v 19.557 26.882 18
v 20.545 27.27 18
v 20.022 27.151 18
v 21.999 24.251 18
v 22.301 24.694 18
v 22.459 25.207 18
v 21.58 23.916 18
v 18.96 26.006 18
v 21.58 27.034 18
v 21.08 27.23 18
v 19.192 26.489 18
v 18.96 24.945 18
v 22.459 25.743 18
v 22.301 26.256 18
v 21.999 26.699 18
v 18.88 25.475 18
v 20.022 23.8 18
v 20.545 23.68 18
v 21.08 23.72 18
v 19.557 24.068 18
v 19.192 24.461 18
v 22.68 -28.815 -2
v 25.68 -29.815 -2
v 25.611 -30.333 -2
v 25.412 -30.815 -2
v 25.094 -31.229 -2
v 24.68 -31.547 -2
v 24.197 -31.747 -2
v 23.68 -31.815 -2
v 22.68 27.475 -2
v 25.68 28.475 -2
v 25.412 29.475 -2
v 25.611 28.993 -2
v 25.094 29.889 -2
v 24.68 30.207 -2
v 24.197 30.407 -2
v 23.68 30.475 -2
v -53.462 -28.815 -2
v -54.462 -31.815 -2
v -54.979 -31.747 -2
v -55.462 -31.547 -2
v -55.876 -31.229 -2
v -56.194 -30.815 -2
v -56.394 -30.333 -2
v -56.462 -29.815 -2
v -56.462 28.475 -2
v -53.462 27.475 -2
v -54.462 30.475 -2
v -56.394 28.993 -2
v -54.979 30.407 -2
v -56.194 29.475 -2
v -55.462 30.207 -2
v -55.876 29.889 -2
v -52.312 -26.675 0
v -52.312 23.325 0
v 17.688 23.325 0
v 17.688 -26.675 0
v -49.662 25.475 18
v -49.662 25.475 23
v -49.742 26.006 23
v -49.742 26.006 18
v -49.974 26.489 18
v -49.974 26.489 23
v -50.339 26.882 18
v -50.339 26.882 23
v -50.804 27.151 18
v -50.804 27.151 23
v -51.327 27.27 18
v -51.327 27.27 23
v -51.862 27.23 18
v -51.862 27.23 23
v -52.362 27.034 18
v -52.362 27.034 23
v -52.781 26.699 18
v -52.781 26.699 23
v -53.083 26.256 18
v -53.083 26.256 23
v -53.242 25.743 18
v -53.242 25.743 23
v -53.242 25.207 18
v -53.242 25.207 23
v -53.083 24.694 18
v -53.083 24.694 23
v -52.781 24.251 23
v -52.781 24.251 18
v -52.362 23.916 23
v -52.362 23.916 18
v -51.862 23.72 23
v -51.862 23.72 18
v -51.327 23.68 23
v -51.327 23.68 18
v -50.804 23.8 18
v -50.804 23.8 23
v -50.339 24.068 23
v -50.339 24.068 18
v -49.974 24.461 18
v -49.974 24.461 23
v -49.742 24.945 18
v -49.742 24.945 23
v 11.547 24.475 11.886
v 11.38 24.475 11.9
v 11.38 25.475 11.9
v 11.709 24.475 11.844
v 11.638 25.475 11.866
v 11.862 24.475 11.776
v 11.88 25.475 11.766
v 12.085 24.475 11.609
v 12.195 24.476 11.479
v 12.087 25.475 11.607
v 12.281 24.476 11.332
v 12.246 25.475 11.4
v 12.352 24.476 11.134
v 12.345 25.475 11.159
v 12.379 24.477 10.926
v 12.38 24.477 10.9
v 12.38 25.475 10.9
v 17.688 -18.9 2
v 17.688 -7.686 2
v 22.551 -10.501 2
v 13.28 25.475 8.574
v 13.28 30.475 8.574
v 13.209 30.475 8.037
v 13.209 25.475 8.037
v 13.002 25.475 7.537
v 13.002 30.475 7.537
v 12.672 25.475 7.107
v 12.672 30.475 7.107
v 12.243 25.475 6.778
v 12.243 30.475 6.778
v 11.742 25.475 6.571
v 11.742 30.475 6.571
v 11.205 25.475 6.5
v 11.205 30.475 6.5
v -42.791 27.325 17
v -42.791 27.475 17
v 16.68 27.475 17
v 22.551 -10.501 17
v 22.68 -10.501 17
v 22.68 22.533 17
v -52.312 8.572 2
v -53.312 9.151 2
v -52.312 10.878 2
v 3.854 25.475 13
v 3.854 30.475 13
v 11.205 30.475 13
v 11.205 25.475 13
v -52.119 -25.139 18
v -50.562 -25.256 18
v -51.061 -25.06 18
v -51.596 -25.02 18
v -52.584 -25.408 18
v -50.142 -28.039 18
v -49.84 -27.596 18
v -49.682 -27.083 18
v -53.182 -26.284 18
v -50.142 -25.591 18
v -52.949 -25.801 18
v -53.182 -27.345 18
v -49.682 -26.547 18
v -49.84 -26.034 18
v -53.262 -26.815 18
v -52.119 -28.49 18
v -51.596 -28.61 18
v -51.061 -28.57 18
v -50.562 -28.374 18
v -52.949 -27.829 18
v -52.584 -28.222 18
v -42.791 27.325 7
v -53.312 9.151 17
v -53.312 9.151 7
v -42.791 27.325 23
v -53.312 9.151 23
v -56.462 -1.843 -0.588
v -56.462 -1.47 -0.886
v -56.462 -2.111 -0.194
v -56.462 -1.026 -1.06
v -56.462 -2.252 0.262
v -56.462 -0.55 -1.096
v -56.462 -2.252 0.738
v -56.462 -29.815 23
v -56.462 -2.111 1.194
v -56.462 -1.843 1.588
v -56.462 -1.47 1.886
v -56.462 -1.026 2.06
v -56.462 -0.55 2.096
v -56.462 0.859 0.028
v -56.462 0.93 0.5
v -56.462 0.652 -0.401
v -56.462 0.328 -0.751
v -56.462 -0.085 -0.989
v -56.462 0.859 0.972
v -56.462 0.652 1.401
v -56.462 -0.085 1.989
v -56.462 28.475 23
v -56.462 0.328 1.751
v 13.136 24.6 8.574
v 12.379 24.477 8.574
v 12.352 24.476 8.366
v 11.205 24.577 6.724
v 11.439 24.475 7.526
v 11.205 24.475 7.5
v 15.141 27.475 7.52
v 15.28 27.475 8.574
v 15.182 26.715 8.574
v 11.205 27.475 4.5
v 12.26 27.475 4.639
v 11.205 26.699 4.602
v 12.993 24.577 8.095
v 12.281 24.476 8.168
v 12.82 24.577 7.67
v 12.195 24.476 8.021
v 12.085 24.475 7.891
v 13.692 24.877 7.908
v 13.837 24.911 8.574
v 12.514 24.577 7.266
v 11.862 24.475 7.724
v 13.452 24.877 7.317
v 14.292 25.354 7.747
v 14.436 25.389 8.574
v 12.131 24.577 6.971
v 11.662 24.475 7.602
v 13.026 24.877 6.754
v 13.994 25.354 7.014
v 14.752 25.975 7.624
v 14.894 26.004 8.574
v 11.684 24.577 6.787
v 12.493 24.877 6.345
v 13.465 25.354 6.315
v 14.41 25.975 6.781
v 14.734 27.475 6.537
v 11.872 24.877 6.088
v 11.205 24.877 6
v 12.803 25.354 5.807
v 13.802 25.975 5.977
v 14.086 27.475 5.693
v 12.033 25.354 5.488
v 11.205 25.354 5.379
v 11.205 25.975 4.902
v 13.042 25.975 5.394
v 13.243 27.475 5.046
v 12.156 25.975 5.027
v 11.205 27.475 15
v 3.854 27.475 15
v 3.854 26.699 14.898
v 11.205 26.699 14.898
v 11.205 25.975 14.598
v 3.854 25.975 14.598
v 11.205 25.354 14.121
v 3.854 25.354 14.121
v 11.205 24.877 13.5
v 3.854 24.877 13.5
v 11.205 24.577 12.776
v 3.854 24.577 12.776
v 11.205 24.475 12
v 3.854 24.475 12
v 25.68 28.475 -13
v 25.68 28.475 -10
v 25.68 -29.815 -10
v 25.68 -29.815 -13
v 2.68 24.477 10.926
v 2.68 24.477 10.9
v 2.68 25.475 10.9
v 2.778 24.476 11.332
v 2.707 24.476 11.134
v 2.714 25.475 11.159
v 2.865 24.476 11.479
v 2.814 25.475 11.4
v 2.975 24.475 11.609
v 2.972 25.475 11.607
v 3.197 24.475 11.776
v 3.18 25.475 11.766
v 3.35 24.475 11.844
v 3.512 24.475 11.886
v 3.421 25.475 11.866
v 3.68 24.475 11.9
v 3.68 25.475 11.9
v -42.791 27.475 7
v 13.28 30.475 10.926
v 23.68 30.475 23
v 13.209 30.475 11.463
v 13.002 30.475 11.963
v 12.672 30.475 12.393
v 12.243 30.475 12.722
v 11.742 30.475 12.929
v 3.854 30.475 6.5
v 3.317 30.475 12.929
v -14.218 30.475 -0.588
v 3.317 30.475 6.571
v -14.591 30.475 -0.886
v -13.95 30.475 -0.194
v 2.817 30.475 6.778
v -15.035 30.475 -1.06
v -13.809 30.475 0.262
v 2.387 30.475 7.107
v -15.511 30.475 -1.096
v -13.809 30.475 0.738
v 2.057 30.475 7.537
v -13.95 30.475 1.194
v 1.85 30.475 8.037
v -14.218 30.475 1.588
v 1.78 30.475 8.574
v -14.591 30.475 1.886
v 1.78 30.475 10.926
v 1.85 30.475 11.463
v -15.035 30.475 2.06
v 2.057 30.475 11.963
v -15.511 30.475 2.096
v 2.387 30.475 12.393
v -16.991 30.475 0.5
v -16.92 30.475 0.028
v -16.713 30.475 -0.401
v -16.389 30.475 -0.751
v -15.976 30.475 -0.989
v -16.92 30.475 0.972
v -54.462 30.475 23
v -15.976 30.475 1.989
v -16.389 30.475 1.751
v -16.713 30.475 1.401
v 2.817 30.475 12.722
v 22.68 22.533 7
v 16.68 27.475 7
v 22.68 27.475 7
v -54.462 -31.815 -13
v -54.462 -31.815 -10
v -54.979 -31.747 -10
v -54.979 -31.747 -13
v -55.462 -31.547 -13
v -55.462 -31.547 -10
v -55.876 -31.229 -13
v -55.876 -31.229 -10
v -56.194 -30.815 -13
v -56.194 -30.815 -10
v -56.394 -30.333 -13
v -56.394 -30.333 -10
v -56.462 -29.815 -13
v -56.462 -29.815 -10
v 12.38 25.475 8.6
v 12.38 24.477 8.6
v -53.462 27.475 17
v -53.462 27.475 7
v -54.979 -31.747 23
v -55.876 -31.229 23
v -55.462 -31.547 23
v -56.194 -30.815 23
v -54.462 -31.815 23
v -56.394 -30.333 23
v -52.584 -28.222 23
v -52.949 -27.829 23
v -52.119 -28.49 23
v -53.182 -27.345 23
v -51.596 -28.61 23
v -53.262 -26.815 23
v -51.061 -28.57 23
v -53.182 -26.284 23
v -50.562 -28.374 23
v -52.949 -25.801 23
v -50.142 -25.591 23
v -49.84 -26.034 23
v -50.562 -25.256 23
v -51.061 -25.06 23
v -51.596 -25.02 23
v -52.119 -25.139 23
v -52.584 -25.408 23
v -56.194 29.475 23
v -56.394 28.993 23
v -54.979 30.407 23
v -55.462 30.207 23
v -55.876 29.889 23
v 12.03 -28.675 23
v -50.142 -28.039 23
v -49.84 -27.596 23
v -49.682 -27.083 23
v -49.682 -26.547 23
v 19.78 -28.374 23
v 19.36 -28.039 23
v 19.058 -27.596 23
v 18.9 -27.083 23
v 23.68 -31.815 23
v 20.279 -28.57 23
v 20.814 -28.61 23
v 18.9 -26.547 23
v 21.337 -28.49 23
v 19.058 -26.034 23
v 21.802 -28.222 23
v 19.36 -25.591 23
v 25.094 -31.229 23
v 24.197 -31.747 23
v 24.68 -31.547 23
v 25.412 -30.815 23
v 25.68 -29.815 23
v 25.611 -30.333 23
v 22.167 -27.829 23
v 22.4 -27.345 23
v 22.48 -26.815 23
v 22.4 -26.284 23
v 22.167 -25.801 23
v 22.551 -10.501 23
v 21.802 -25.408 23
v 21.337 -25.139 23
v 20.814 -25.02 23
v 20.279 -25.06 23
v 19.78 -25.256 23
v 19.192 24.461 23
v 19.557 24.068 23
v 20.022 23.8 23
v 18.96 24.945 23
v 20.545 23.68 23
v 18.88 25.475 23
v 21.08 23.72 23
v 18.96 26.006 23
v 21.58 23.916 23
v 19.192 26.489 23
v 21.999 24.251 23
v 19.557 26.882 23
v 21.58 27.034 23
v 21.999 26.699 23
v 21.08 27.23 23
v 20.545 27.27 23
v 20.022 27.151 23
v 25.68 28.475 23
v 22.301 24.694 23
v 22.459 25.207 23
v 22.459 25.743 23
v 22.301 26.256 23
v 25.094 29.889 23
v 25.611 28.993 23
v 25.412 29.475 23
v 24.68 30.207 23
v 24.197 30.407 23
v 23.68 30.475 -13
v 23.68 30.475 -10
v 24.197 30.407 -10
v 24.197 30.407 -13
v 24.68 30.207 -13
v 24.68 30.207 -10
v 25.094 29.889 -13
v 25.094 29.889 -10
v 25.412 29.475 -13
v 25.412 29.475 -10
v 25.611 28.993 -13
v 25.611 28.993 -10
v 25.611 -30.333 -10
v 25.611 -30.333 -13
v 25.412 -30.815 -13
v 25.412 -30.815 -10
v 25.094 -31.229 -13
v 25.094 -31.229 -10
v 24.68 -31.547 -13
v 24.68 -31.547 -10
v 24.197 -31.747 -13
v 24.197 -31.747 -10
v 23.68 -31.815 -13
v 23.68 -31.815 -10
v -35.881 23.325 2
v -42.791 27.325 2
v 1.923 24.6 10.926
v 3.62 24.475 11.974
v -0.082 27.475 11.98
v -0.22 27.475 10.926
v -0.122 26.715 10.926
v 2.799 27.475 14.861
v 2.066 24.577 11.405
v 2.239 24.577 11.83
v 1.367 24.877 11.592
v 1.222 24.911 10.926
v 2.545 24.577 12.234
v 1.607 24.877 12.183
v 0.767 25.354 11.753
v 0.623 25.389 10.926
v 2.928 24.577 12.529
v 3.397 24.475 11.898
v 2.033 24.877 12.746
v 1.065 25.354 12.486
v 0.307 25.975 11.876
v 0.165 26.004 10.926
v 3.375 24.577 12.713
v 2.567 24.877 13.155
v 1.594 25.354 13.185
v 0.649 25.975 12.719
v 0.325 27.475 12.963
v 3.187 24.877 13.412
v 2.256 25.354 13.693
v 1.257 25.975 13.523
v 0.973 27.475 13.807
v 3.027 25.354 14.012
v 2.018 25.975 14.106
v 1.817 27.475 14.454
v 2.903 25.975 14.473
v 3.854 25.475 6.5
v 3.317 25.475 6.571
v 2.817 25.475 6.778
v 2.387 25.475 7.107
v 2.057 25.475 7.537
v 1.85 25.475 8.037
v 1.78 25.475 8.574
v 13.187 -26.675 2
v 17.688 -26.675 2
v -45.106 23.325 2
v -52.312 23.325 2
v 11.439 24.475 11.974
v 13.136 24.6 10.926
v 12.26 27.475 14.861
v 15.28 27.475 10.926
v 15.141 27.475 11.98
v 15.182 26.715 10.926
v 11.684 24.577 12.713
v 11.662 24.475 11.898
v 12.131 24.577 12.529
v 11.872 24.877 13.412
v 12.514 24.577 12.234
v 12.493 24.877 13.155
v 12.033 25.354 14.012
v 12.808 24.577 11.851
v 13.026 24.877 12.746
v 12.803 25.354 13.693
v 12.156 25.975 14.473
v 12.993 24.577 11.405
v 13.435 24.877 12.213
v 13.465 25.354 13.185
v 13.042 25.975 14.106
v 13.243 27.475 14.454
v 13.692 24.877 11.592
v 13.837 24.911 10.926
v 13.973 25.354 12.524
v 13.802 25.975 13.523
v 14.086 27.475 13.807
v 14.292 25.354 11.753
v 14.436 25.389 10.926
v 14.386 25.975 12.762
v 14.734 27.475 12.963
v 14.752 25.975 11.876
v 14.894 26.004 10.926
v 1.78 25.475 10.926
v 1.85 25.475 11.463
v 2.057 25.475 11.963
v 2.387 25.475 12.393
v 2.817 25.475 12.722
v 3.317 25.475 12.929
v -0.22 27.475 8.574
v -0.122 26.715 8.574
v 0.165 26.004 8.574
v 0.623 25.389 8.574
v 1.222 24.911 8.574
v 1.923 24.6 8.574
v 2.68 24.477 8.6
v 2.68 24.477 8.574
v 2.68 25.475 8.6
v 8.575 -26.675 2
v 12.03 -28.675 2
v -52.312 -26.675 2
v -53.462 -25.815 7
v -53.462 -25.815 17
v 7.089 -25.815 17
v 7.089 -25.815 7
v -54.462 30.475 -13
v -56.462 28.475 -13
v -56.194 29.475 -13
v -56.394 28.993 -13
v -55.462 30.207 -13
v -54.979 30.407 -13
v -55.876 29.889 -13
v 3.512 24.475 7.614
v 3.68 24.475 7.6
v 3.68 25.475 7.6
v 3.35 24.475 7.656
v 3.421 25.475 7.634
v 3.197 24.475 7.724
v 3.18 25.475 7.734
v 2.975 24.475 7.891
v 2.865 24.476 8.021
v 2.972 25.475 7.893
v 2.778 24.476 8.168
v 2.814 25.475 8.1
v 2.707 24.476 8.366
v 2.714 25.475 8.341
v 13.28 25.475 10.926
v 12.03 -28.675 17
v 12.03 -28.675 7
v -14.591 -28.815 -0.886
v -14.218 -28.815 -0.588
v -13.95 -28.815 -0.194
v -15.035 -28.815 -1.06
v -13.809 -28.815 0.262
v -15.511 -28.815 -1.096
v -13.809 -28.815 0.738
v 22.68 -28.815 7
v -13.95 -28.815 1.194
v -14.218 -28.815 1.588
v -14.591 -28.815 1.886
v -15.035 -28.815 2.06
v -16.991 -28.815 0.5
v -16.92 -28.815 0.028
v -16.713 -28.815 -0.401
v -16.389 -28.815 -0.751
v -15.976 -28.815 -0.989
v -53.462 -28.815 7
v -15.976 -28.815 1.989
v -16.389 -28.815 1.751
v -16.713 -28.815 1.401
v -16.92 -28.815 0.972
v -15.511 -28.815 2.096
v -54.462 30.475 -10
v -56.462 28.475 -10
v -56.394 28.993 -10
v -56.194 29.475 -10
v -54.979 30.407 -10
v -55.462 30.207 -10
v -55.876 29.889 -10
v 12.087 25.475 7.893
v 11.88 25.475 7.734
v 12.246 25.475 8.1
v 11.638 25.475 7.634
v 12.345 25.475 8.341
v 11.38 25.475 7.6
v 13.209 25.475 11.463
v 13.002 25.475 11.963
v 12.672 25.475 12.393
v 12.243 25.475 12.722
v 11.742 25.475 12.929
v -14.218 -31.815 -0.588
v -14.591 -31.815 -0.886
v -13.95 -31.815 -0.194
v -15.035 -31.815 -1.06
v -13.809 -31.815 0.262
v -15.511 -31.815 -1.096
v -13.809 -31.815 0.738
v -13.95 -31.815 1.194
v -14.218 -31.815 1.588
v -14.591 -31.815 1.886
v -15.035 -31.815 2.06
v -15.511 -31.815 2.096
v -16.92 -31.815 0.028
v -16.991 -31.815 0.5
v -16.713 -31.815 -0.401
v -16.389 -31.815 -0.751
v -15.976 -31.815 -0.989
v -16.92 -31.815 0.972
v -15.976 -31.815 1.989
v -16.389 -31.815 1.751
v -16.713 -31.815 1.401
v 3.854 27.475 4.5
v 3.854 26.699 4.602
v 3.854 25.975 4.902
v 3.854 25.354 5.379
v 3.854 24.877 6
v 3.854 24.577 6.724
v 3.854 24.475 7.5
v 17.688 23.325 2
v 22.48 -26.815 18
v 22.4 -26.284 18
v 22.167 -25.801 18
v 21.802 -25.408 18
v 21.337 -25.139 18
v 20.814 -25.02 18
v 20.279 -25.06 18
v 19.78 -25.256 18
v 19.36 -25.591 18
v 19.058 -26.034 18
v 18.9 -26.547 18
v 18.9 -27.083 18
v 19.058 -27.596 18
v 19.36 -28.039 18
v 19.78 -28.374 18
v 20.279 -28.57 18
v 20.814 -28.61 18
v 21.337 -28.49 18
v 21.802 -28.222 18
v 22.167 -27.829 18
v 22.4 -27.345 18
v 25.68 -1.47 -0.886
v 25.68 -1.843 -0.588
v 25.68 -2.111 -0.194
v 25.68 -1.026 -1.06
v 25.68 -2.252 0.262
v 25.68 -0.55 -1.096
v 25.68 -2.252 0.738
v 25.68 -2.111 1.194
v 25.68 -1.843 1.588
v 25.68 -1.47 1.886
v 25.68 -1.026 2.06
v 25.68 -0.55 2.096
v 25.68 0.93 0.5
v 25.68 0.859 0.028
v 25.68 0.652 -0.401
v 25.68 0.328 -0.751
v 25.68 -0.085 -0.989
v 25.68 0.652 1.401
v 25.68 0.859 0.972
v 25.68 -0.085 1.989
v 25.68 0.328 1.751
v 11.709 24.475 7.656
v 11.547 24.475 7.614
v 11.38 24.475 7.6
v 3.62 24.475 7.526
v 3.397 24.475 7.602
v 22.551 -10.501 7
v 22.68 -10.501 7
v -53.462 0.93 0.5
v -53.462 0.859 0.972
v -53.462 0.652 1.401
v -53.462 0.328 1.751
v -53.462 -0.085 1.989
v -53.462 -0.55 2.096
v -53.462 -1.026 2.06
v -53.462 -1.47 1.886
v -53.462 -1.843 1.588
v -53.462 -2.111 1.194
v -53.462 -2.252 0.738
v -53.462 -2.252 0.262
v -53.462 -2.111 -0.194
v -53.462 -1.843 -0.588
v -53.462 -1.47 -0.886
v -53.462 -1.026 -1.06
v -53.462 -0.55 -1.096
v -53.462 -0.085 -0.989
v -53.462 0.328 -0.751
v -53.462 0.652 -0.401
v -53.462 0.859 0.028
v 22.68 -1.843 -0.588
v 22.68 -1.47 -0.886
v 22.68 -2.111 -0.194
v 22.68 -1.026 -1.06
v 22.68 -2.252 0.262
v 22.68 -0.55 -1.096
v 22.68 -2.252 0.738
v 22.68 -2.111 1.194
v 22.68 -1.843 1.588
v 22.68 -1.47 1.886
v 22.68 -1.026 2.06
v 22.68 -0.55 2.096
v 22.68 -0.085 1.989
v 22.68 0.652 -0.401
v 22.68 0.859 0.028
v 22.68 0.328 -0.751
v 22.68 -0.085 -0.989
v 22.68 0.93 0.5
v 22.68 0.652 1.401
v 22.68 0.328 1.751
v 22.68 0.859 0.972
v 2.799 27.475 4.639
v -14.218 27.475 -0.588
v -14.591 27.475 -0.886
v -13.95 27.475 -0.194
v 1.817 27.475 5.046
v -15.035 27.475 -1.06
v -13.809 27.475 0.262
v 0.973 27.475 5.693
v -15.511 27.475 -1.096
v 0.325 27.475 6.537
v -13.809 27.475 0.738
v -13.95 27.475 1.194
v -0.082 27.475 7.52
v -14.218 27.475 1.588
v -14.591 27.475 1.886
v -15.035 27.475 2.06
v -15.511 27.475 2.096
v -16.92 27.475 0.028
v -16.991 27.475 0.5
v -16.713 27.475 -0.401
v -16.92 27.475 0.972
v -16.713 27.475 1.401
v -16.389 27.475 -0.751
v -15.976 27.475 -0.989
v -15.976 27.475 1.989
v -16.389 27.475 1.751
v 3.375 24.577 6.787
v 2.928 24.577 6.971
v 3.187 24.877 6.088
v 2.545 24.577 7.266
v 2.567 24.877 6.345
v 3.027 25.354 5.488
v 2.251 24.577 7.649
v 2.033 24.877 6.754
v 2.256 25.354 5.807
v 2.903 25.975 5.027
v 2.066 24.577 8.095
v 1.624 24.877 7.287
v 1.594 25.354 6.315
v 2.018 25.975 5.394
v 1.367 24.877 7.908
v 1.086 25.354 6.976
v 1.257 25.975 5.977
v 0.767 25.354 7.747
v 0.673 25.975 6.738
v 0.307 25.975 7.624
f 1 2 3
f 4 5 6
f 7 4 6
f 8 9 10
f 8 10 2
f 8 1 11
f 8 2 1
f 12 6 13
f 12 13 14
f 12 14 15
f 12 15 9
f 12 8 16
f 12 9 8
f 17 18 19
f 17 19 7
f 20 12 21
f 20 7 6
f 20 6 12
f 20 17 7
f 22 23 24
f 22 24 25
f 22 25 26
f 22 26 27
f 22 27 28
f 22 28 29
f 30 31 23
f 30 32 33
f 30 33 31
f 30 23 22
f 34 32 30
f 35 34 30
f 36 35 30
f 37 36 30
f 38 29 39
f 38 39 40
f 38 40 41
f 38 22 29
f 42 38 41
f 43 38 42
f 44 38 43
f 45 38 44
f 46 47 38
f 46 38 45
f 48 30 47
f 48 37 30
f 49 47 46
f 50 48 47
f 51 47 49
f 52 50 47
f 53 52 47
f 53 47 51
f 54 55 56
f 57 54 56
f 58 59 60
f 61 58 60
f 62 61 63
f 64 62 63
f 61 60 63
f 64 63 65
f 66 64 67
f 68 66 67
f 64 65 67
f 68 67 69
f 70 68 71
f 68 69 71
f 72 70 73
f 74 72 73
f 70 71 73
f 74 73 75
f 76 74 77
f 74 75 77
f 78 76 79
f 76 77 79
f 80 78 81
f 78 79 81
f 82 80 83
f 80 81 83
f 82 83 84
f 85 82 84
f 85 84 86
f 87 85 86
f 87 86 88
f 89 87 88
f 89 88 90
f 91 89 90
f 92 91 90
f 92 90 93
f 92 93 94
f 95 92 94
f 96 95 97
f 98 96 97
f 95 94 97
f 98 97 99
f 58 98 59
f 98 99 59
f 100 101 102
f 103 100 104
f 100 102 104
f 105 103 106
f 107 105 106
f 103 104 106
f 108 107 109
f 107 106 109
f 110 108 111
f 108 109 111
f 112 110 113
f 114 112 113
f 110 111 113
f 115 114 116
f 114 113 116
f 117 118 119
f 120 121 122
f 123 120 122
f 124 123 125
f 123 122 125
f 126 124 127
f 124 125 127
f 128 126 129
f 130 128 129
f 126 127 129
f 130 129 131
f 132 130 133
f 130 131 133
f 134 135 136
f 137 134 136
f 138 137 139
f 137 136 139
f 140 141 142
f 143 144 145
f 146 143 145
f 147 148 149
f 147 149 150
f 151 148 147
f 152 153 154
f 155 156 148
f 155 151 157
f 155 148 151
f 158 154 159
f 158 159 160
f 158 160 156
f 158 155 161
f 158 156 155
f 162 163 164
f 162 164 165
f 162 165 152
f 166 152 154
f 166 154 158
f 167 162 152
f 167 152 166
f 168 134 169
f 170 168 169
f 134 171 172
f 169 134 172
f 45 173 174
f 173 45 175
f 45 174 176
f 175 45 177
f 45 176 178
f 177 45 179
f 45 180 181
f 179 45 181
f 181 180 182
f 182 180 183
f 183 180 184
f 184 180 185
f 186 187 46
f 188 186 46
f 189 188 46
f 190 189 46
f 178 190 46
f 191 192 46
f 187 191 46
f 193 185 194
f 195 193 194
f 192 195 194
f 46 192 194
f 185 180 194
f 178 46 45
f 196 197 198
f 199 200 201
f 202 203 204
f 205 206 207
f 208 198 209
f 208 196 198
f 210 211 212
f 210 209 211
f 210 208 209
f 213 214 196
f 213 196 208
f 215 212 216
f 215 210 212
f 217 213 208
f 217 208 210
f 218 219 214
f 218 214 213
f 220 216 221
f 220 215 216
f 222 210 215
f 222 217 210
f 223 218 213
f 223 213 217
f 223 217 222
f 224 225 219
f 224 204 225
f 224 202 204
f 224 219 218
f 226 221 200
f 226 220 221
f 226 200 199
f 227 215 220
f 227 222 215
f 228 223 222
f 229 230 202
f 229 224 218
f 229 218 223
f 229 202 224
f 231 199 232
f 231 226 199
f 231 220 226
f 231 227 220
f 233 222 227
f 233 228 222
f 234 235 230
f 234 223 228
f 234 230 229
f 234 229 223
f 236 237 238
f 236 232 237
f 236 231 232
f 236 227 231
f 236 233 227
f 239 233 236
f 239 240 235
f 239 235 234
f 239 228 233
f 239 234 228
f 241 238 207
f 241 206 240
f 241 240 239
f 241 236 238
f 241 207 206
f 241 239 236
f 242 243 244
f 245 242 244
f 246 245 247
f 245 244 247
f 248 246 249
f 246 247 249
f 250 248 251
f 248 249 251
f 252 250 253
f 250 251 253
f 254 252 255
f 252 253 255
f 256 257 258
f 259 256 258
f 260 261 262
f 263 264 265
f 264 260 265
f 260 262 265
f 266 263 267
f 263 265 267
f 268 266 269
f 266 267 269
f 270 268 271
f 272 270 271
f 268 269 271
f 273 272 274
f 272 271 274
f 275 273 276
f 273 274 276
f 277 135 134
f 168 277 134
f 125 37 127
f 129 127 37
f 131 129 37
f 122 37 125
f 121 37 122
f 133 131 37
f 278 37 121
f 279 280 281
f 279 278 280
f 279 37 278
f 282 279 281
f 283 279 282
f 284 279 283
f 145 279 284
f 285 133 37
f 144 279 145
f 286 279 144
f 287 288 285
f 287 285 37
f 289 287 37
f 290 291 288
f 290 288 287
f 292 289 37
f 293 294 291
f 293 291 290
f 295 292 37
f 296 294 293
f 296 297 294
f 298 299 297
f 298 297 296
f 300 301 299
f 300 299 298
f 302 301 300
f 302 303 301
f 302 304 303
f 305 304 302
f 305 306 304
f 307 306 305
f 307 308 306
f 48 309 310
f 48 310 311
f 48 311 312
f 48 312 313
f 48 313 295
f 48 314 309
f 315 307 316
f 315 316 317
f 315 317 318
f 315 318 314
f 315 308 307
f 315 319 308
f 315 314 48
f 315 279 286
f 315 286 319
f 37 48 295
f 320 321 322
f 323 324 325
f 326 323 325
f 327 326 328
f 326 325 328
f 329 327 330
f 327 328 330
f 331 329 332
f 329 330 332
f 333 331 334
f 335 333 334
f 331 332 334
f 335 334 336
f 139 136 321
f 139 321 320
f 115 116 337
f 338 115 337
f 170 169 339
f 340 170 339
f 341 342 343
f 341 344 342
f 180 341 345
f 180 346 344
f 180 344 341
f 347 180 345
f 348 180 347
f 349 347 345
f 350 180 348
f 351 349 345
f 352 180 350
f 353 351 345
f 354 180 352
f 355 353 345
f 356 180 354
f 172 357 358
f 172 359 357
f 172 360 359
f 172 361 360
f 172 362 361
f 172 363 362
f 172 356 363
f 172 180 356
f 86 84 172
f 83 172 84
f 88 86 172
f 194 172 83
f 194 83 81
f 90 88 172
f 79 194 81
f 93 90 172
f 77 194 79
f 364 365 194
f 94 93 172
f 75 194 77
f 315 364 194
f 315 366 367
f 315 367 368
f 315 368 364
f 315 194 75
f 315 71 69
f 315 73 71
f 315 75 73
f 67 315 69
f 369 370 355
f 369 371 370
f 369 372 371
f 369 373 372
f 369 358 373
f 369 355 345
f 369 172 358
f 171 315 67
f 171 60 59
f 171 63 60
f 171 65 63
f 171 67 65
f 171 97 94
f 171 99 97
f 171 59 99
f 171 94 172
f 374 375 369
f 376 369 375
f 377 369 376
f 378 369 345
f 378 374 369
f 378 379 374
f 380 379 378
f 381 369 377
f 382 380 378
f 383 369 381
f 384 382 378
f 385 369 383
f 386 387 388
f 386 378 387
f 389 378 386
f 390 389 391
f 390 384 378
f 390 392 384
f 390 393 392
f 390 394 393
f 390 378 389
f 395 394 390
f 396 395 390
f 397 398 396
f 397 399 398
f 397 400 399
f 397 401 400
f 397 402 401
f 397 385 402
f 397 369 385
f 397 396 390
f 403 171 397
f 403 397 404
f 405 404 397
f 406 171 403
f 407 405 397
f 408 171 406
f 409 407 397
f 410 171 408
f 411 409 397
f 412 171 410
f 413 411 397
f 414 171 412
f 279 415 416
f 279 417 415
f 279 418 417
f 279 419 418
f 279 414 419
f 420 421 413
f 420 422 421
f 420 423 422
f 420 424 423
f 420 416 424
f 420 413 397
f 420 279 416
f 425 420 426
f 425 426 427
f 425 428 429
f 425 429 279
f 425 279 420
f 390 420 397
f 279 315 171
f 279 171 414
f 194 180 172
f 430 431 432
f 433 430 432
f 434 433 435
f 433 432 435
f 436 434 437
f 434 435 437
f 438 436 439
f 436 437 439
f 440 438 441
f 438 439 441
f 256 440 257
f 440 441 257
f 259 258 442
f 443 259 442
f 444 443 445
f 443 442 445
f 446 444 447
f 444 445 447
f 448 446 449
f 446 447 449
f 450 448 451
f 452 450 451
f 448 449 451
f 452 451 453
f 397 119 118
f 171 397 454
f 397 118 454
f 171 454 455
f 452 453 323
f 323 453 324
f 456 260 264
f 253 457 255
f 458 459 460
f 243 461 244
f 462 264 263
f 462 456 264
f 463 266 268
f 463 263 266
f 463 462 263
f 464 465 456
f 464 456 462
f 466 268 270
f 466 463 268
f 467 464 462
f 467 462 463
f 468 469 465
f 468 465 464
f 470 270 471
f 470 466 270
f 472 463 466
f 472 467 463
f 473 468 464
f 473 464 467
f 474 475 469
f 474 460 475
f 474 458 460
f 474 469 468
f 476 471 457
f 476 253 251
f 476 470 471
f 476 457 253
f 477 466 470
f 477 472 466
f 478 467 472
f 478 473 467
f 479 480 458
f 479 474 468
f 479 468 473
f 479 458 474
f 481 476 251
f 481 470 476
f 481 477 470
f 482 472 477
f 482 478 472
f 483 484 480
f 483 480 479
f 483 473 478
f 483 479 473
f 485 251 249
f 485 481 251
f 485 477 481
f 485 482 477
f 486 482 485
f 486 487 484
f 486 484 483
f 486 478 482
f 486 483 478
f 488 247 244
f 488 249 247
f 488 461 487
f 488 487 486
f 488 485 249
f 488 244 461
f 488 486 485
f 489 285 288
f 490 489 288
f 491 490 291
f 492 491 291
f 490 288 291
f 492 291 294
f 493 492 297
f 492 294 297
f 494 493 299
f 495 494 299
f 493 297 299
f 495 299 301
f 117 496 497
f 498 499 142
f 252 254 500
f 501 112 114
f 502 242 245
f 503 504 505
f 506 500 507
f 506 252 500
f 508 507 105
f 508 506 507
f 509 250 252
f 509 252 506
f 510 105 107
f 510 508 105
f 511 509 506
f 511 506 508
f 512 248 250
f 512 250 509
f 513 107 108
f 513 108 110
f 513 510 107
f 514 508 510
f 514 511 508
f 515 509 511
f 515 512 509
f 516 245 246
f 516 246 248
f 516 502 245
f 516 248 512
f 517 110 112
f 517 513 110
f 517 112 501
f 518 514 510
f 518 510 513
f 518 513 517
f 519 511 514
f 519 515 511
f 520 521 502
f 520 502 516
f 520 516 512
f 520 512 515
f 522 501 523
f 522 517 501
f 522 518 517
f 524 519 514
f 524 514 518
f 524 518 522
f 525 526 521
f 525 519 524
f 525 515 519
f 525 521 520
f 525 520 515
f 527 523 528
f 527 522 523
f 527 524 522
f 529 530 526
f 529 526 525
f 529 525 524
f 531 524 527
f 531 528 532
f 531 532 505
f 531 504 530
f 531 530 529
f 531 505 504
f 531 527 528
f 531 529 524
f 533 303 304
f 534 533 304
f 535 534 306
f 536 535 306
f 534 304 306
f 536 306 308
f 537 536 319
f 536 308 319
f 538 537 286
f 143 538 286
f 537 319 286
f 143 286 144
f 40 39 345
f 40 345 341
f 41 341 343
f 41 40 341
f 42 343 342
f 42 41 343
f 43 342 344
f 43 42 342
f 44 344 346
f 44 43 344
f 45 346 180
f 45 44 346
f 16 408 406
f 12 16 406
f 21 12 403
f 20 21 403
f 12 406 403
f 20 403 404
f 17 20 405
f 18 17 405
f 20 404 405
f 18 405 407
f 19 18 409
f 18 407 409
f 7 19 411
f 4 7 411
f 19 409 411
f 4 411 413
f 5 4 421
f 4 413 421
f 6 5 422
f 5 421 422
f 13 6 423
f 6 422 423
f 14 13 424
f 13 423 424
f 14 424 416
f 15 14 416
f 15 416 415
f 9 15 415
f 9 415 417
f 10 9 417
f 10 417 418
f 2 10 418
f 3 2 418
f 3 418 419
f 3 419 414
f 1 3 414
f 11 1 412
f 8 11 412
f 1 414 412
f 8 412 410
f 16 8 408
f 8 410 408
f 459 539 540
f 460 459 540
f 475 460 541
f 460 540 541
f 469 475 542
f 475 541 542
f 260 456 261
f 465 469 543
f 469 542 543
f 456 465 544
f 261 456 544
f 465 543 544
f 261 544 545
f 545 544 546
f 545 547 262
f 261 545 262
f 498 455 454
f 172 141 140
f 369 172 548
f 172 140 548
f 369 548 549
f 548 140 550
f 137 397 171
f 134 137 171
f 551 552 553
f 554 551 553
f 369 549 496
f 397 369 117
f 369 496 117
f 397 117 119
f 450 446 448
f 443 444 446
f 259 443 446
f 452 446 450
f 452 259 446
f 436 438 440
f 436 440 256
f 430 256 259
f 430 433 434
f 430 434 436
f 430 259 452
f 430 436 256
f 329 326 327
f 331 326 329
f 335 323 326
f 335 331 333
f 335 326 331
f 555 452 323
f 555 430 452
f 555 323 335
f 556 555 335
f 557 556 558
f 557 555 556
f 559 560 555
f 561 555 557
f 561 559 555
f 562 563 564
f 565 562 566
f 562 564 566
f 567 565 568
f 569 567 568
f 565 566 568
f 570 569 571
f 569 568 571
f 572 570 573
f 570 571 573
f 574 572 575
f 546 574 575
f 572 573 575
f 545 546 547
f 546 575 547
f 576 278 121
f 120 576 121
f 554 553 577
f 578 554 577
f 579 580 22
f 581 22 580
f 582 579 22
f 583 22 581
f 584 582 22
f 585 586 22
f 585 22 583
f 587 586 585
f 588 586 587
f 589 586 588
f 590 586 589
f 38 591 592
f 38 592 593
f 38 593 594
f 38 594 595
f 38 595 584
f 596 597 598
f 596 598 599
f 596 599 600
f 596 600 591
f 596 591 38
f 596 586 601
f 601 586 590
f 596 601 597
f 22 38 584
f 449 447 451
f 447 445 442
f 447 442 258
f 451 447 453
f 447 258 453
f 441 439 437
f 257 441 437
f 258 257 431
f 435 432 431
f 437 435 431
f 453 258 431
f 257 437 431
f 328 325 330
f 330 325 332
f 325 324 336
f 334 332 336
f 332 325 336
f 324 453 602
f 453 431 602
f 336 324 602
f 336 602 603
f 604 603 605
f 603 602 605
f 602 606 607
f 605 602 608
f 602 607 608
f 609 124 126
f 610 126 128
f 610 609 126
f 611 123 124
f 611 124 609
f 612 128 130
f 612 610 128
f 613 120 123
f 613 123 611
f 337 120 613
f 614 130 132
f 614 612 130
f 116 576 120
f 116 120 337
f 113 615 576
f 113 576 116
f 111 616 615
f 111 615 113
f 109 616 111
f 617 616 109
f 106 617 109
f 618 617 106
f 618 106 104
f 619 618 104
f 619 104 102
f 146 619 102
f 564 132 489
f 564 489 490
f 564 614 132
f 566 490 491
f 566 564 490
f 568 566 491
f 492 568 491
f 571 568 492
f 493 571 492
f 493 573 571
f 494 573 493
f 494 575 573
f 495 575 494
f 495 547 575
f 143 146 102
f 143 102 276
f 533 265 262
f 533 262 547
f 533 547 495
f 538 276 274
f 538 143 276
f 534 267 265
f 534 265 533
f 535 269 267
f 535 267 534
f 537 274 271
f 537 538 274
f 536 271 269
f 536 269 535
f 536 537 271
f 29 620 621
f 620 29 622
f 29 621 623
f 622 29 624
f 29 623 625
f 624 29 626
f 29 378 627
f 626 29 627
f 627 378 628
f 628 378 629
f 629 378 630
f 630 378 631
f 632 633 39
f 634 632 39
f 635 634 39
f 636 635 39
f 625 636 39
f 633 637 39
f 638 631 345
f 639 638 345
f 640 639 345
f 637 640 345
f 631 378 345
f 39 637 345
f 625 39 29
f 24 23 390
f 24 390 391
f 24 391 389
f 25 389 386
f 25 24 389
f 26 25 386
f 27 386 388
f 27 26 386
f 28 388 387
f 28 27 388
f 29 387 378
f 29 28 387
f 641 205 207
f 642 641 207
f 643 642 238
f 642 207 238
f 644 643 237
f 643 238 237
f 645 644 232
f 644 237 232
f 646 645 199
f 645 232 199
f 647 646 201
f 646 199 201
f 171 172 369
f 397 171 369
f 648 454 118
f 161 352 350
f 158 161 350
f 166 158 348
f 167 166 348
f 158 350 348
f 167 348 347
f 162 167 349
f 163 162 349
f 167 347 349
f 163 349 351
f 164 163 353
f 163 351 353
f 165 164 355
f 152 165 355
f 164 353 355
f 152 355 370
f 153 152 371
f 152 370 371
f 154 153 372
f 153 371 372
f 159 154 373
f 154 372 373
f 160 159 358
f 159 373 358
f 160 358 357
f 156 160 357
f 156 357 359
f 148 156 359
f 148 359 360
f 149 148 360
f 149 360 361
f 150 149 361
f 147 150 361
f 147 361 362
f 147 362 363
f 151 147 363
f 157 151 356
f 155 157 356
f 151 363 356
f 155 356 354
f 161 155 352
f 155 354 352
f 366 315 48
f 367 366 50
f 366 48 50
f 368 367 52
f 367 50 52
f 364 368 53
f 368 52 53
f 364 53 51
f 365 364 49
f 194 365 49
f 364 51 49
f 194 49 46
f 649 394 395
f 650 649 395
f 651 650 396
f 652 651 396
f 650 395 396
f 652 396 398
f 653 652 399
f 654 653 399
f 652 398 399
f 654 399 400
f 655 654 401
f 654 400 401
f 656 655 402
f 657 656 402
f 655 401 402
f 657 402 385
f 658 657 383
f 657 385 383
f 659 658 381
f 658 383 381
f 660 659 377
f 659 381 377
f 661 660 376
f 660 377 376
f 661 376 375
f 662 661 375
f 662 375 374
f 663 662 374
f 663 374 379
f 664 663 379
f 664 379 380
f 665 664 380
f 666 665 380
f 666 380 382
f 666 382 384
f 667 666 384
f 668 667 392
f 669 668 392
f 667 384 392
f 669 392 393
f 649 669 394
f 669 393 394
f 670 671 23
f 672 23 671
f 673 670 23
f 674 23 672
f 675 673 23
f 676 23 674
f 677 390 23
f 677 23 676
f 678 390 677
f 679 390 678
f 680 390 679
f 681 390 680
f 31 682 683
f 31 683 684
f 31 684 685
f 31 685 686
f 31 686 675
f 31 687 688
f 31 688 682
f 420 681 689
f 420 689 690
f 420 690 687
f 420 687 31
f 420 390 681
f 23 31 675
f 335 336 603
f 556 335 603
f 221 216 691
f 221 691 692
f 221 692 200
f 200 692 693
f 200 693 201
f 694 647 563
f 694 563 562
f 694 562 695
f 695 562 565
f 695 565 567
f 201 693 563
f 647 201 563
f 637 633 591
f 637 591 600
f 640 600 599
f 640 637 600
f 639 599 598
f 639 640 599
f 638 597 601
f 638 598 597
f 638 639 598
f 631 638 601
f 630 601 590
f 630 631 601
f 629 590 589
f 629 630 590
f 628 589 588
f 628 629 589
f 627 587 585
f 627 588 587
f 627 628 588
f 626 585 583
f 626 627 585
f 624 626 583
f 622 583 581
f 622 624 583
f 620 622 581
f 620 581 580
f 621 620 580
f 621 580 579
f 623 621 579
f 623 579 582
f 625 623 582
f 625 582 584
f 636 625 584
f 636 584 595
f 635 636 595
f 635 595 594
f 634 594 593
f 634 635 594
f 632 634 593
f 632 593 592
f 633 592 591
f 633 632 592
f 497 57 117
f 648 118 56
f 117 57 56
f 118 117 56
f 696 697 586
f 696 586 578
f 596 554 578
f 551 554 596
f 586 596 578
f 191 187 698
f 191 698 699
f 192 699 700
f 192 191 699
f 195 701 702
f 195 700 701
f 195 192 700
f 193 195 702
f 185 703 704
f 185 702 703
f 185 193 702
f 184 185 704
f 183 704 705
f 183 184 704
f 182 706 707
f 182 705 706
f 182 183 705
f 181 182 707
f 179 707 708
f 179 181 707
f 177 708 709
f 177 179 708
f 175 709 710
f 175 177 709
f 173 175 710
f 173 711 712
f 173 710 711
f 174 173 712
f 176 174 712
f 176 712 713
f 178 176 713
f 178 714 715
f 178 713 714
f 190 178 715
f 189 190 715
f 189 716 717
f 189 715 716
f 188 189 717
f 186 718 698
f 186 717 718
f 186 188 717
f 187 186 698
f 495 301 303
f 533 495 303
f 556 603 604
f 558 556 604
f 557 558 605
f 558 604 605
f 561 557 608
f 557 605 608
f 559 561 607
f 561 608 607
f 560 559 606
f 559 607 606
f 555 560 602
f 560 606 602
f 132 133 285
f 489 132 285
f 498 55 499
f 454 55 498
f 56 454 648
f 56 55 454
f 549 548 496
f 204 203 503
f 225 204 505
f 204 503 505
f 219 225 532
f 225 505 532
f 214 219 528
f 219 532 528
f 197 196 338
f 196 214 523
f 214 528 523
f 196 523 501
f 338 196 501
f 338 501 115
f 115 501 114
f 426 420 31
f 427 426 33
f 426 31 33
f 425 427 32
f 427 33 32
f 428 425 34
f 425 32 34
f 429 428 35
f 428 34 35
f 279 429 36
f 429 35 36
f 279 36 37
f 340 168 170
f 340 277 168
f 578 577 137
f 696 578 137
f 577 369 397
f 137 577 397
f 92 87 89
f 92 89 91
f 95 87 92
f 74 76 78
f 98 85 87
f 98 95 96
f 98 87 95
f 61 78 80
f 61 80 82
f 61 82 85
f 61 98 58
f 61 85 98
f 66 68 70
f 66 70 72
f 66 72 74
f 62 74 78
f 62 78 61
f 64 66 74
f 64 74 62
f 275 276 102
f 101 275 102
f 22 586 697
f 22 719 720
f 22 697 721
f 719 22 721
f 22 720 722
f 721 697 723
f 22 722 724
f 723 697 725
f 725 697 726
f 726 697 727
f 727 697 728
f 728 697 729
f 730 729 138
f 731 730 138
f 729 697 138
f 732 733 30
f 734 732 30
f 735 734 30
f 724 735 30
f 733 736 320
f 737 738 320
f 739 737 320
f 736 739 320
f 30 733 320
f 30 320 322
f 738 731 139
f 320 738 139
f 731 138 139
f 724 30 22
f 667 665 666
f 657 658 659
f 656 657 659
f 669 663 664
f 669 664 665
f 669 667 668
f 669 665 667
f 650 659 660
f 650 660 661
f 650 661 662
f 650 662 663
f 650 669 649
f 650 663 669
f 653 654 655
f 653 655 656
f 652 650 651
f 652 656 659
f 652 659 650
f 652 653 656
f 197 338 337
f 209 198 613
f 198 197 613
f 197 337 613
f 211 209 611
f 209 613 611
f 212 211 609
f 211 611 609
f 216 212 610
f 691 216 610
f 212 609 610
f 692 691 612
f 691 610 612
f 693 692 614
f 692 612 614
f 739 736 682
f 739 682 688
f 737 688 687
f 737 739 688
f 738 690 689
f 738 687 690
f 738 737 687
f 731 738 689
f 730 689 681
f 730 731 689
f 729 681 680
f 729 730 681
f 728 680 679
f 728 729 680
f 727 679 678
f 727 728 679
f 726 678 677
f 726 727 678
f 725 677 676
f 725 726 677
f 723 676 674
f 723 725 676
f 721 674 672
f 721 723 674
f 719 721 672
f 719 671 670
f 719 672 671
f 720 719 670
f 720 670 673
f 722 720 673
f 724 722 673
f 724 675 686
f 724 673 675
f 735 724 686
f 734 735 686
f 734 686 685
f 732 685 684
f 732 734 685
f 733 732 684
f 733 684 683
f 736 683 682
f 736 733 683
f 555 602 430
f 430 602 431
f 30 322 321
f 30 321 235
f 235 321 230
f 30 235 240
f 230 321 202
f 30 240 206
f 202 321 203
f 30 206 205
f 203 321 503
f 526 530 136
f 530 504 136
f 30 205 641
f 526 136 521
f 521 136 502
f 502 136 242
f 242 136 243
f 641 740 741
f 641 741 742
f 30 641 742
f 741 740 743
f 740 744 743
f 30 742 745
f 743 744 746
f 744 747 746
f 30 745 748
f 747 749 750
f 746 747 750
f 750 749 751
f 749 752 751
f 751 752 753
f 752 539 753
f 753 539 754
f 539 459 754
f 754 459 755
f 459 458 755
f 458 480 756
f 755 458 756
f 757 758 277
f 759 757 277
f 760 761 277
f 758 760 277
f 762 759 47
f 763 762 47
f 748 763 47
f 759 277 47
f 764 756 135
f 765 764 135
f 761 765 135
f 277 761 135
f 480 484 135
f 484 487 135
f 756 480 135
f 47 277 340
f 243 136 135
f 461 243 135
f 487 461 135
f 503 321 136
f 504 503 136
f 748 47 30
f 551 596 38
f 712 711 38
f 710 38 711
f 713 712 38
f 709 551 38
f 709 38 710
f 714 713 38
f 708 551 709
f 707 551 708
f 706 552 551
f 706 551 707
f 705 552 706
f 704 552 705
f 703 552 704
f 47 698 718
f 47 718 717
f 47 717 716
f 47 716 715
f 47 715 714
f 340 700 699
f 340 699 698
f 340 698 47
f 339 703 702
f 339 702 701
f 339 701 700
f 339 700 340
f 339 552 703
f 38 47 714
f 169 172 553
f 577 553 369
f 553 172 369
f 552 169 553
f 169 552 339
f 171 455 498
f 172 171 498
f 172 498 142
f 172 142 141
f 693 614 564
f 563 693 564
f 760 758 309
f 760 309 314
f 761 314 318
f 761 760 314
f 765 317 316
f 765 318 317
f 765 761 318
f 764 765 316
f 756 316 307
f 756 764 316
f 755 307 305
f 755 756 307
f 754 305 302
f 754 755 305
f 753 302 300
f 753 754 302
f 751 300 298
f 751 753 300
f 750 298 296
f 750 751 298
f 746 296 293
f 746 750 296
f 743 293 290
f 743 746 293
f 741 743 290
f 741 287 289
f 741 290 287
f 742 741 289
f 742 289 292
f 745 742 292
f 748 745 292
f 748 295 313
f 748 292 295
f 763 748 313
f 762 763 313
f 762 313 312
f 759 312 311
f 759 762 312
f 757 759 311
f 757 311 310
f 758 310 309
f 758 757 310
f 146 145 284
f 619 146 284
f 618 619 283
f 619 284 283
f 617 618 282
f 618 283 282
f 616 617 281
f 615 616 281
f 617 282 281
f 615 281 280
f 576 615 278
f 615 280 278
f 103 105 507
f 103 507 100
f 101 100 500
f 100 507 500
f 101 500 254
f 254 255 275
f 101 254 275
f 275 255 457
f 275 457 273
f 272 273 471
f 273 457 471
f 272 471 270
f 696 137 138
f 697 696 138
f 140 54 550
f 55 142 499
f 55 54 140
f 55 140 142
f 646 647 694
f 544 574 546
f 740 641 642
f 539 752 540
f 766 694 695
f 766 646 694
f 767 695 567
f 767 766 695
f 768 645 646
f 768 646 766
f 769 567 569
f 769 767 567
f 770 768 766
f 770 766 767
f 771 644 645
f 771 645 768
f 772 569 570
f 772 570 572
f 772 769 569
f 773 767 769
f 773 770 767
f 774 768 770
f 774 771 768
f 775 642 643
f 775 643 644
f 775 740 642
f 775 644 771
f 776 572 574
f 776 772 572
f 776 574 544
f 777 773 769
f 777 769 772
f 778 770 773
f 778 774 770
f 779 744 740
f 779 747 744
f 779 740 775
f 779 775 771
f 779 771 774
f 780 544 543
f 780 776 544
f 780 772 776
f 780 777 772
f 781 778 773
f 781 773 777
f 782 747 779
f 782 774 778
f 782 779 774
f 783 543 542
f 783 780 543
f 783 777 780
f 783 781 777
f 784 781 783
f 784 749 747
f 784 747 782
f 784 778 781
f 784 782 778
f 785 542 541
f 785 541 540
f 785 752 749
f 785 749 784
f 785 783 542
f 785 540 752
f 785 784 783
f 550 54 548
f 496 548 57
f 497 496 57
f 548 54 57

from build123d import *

# Parameters (mm, degrees)
SKETCH1_W                = 70
SKETCH1_H                = 50
BOSS_EXTRUDE1_DEPTH      = 2
BOSS_EXTRUDE2_DEPTH      = 21
EXTRUDE_THIN1_DEPTH      = 10
EXTRUDE_THIN1_DEPTH_BACK = 23
SKETCH3_W                = 82.141201594
SKETCH3_H                = 62.29
SKETCH3_W_2              = 76.141201594
SKETCH3_H_2              = 56.29
SKETCH4_W                = 76.141201594
SKETCH4_H                = 56.29
BOSS_EXTRUDE3_DEPTH      = 6
FILLET1_R                = 2
BOSS_EXTRUDE4_DEPTH      = 3
BOSS_EXTRUDE8_DEPTH      = 10
CUT_EXTRUDE1_DEPTH       = 8
CUT_EXTRUDE2_DEPTH       = 8
EXTRUDE_THIN2_DEPTH      = 6
BOSS_EXTRUDE9_START      = 2
BOSS_EXTRUDE9_DEPTH      = 1
FILLET2_R                = 3
SKETCH11_R               = 1.8
CUT_EXTRUDE3_DEPTH       = 5
CUT_EXTRUDE4_DEPTH       = 88.160559078
CUT_EXTRUDE4_DEPTH_BACK  = 88.160559078
SKETCH12_R               = 1.6
CUT_EXTRUDE5_DEPTH       = 92.040453046
CUT_EXTRUDE5_DEPTH_BACK  = 92.040453046
SKETCH13_R               = 1.6


with BuildPart() as part:
    # Sketch1 → Boss-Extrude1 (new body)
    with BuildSketch(Plane.XY):
        with Locations((-17.311659193, -1.674887892)):
            Rectangle(SKETCH1_W, SKETCH1_H)
    extrude(amount=BOSS_EXTRUDE1_DEPTH)

    # Sketch2 → Boss-Extrude2 (add)
    with BuildSketch(Plane.XY.offset(2)):
        Polygon((-42.790623702, 27.325112108), (-53.311659193, 9.150739706), (12.029536823, -28.674887892), (22.550572314, -10.500515491), align=None)
    extrude(amount=BOSS_EXTRUDE2_DEPTH)


with BuildPart() as body_2:
    # Sketch3 → Extrude-Thin1 (new, two sides: drawn at the far end of the back side and taken through both)
    with BuildSketch(Plane(origin=(0, 0, 0), x_dir=(-1, 0, 0), z_dir=(0, 0, -1)).offset(-EXTRUDE_THIN1_DEPTH_BACK)):
        with Locations((15.391058396, -0.669887892)):
            Rectangle(SKETCH3_W, SKETCH3_H)
        with Locations((15.391058396, -0.669887892)):
            Rectangle(SKETCH3_W_2, SKETCH3_H_2, mode=Mode.SUBTRACT)
    extrude(amount=EXTRUDE_THIN1_DEPTH + EXTRUDE_THIN1_DEPTH_BACK)

    # Sketch4 → Boss-Extrude3 (add)
    with BuildSketch(Plane.XY.offset(23)):
        with Locations((-15.391058396, -0.669887892)):
            Rectangle(SKETCH4_W, SKETCH4_H)
        Polygon((-42.790623702, 27.325112108), (-53.311659193, 9.150739706), (12.029536823, -28.674887892), (22.550572314, -10.500515491), align=None, mode=Mode.SUBTRACT)
    extrude(amount=-BOSS_EXTRUDE3_DEPTH)

    # Fillet1
    fillet1_edges = [body_2.edges().sort_by_distance(p)[0] for p in [
        (-56.461659193, 30.475112108, 6.5),
        (-56.461659193, -31.814887892, 6.5),
        (25.679542401, -31.814887892, 6.5),
        (25.679542401, 30.475112108, 6.5),
    ]]
    fillet(fillet1_edges, radius=FILLET1_R)

    # Sketch6 → Boss-Extrude8 (add)
    with BuildSketch(Plane(origin=(0, 0, 17), x_dir=(-1, 0, 0), z_dir=(0, 0, -1))):
        Polygon((-16.679542401, 27.475112108), (-22.679542401, 22.532519231), (-22.679542401, 27.475112108), align=None)
        Polygon((42.790623702, 27.325112108), (53.311659193, 9.150739706), (53.461659193, 27.475112108), (42.790623702, 27.475112108), align=None)
        Polygon((-12.029536823, -28.674887892), (-22.550572314, -10.500515491), (-22.679542401, -10.500515491), (-22.679542401, -28.814887892), (53.461659193, -28.814887892), (53.461659193, -25.814887892), (-7.089081569, -25.814887892), align=None)
    extrude(amount=BOSS_EXTRUDE8_DEPTH)

    # Sketch7 → Cut-Extrude1 (cut)
    with BuildSketch(Plane(origin=(0, 0, -10), x_dir=(-1, 0, 0), z_dir=(0, 0, -1))):
        Polygon((-28.614884021, 33.287753378), (-28.614884021, -37.390774311), (75.821884566, -37.390774311), (71.624058107, 45.166479381), align=None)
    extrude(amount=-CUT_EXTRUDE1_DEPTH, mode=Mode.SUBTRACT)

    # Sketch8 → Cut-Extrude2 (cut)
    with BuildSketch(Plane(origin=(0, 30.475112108, 0), x_dir=(1, 0, 0), z_dir=(0, 1, 0))):
        with BuildLine():
            Line((1.779542401, -8.574068331), (1.779542401, -10.925931669))
            ThreePointArc((1.779542401, -10.925931669), (2.38702295, -12.392519451), (3.853610732, -13))
            Line((3.853610732, -13), (11.20547407, -13))
            ThreePointArc((11.20547407, -13), (12.672061852, -12.392519451), (13.279542401, -10.925931669))
            Line((13.279542401, -10.925931669), (13.279542401, -8.574068331))
            ThreePointArc((13.279542401, -8.574068331), (12.672061852, -7.107480549), (11.20547407, -6.5))
            Line((11.20547407, -6.5), (3.853610732, -6.5))
            ThreePointArc((3.853610732, -6.5), (2.38702295, -7.107480549), (1.779542401, -8.574068331))
        make_face()
    extrude(amount=-CUT_EXTRUDE2_DEPTH, mode=Mode.SUBTRACT)

    # Sketch8<2> → Extrude-Thin2 (add)
    with BuildSketch(Plane(origin=(0, 30.475112108, 0), x_dir=(1, 0, 0), z_dir=(0, 1, 0))):
        with BuildLine():
            Line((-0.220457599, -8.574068331), (-0.220457599, -10.925931669))
            ThreePointArc((-0.220457599, -10.925931669), (0.972809388, -13.806733013), (3.853610732, -15))
            Line((3.853610732, -15), (11.20547407, -15))
            ThreePointArc((11.20547407, -15), (14.086275414, -13.806733013), (15.279542401, -10.925931669))
            Line((15.279542401, -10.925931669), (15.279542401, -8.574068331))
            ThreePointArc((15.279542401, -8.574068331), (14.086275414, -5.693266987), (11.20547407, -4.5))
            Line((11.20547407, -4.5), (3.853610732, -4.5))
            ThreePointArc((3.853610732, -4.5), (0.972809388, -5.693266987), (-0.220457599, -8.574068331))
        make_face()
        with BuildLine():
            Line((1.779542401, -8.574068331), (1.779542401, -10.925931669))
            ThreePointArc((1.779542401, -10.925931669), (2.38702295, -12.392519451), (3.853610732, -13))
            Line((3.853610732, -13), (11.20547407, -13))
            ThreePointArc((11.20547407, -13), (12.672061852, -12.392519451), (13.279542401, -10.925931669))
            Line((13.279542401, -10.925931669), (13.279542401, -8.574068331))
            ThreePointArc((13.279542401, -8.574068331), (12.672061852, -7.107480549), (11.20547407, -6.5))
            Line((11.20547407, -6.5), (3.853610732, -6.5))
            ThreePointArc((3.853610732, -6.5), (2.38702295, -7.107480549), (1.779542401, -8.574068331))
        make_face(mode=Mode.SUBTRACT)
    extrude(amount=-EXTRUDE_THIN2_DEPTH)

    # Sketch10 → Boss-Extrude9 (add)
    with BuildSketch(Plane.XZ.offset(-27.475112108).offset(BOSS_EXTRUDE9_START)):
        with BuildLine():
            Line((1.779542401, 8.574068331), (1.779542401, 10.925931669))
            ThreePointArc((1.779542401, 10.925931669), (2.38702295, 12.392519451), (3.853610732, 13))
            Line((3.853610732, 13), (11.20547407, 13))
            ThreePointArc((11.20547407, 13), (12.672061852, 12.392519451), (13.279542401, 10.925931669))
            Line((13.279542401, 10.925931669), (13.279542401, 8.574068331))
            ThreePointArc((13.279542401, 8.574068331), (12.672061852, 7.107480549), (11.20547407, 6.5))
            Line((11.20547407, 6.5), (3.853610732, 6.5))
            ThreePointArc((3.853610732, 6.5), (2.38702295, 7.107480549), (1.779542401, 8.574068331))
        make_face()
        with BuildLine():
            Line((3.679542401, 11.9), (11.379542401, 11.9))
            ThreePointArc((11.379542401, 11.9), (12.086649182, 11.607106781), (12.379542401, 10.9))
            Line((12.379542401, 10.9), (12.379542401, 8.6))
            ThreePointArc((12.379542401, 8.6), (12.086649182, 7.892893219), (11.379542401, 7.6))
            Line((11.379542401, 7.6), (3.679542401, 7.6))
            ThreePointArc((3.679542401, 7.6), (2.97243562, 7.892893219), (2.679542401, 8.6))
            Line((2.679542401, 8.6), (2.679542401, 10.9))
            ThreePointArc((2.679542401, 10.9), (2.97243562, 11.607106781), (3.679542401, 11.9))
        make_face(mode=Mode.SUBTRACT)
    extrude(amount=BOSS_EXTRUDE9_DEPTH)

    # Fillet2
    # the kernel refuses this fillet: 3 mm, written as the material it takes off along each edge
    with BuildSketch(Plane(origin=(3.853610732, 24.475112108, 15), x_dir=(0, 1, 0), z_dir=(1, 0, 0)), Plane(origin=(11.20547407, 24.475112108, 4.5), x_dir=(0, 1, 0), z_dir=(-1, 0, 0))) as fillet2_piece_1:
        with BuildLine():
            CenterArc((FILLET2_R, -FILLET2_R), FILLET2_R, 90, 90)
            Line((0, -FILLET2_R), (0, 0))
            Line((0, 0), (FILLET2_R, 0))
        make_face()
    extrude(amount=7.351863339, mode=Mode.SUBTRACT)
    with BuildSketch(Plane(origin=(11.20547407, 24.475112108, 10.925931669), x_dir=(0, 0, 1), z_dir=(-1, 0, 0))) as fillet2_piece_2:
        with BuildLine():
            CenterArc((4.074068331 - FILLET2_R, FILLET2_R), FILLET2_R, 270, 90)
            Line((4.074068331 - FILLET2_R, 0), (4.074068331, 0))
            Line((4.074068331, 0), (4.074068331, FILLET2_R))
        make_face()
    revolve(axis=Axis((11.20547407, 24.475112108, 10.925931669), (0, 1, 0)), revolution_arc=90, mode=Mode.SUBTRACT)
    with BuildSketch(Plane(origin=(11.20547407, 24.475112108, 8.574068331), x_dir=(1, 0, 0), z_dir=(0, 0, 1))) as fillet2_piece_3:
        with BuildLine():
            CenterArc((4.074068331 - FILLET2_R, FILLET2_R), FILLET2_R, 270, 90)
            Line((4.074068331 - FILLET2_R, 0), (4.074068331, 0))
            Line((4.074068331, 0), (4.074068331, FILLET2_R))
        make_face()
    revolve(axis=Axis((11.20547407, 24.475112108, 8.574068331), (0, 1, 0)), revolution_arc=90, mode=Mode.SUBTRACT)
    with BuildSketch(Plane(origin=(3.853610732, 24.475112108, 8.574068331), x_dir=(0, 0, -1), z_dir=(1, 0, 0))) as fillet2_piece_4:
        with BuildLine():
            CenterArc((4.074068331 - FILLET2_R, FILLET2_R), FILLET2_R, 270, 90)
            Line((4.074068331 - FILLET2_R, 0), (4.074068331, 0))
            Line((4.074068331, 0), (4.074068331, FILLET2_R))
        make_face()
    revolve(axis=Axis((3.853610732, 24.475112108, 8.574068331), (0, 1, 0)), revolution_arc=90, mode=Mode.SUBTRACT)
    with BuildSketch(Plane(origin=(3.853610732, 24.475112108, 10.925931669), x_dir=(-1, 0, 0), z_dir=(0, 0, -1))) as fillet2_piece_5:
        with BuildLine():
            CenterArc((4.074068331 - FILLET2_R, FILLET2_R), FILLET2_R, 270, 90)
            Line((4.074068331 - FILLET2_R, 0), (4.074068331, 0))
            Line((4.074068331, 0), (4.074068331, FILLET2_R))
        make_face()
    revolve(axis=Axis((3.853610732, 24.475112108, 10.925931669), (0, 1, 0)), revolution_arc=90, mode=Mode.SUBTRACT)
    with BuildSketch(Plane(origin=(-0.220457599, 24.475112108, 8.574068331), x_dir=(0, 1, 0), z_dir=(0, 0, 1)), Plane(origin=(15.279542401, 24.475112108, 10.925931669), x_dir=(0, 1, 0), z_dir=(0, 0, -1))) as fillet2_piece_6:
        with BuildLine():
            CenterArc((FILLET2_R, -FILLET2_R), FILLET2_R, 90, 90)
            Line((0, -FILLET2_R), (0, 0))
            Line((0, 0), (FILLET2_R, 0))
        make_face()
    extrude(amount=2.351863339, mode=Mode.SUBTRACT)

    # Sketch11 → Cut-Extrude3 (cut)
    with BuildSketch(Plane.XY.offset(23)):
        with Locations((-51.461659193, 25.475112108)):
            Circle(SKETCH11_R)
        with Locations(Location((-51.461659193, -26.814887892, 0), (0, 0, 180))):
            Circle(SKETCH11_R)
        with Locations((20.679542401, -26.814887892)):
            Circle(SKETCH11_R)
        with Locations(Location((20.679542401, 25.475112108, 0), (0, 0, 180))):
            Circle(SKETCH11_R)
    extrude(amount=-CUT_EXTRUDE3_DEPTH, mode=Mode.SUBTRACT)

    # Sketch12 → Cut-Extrude4 (cut, two sides: drawn at the far end of the back side and taken through both)
    with BuildSketch(Plane(origin=(0, 30.475112108, 0), x_dir=(1, 0, 0), z_dir=(0, 1, 0)).offset(-CUT_EXTRUDE4_DEPTH_BACK)):
        with Locations(Location((-15.391058396, -0.5, 0), (0, 0, 180))):
            Circle(SKETCH12_R)
    extrude(amount=CUT_EXTRUDE4_DEPTH + CUT_EXTRUDE4_DEPTH_BACK, mode=Mode.SUBTRACT)

    # Sketch13 → Cut-Extrude5 (cut, two sides: drawn at the far end of the back side and taken through both)
    with BuildSketch(Plane(origin=(25.679542401, 0, 0), x_dir=(0, 0, -1), z_dir=(1, 0, 0)).offset(-CUT_EXTRUDE5_DEPTH_BACK)):
        with Locations(Location((-0.5, -0.669887892, 0), (0, 0, 90))):
            Circle(SKETCH13_R)
    extrude(amount=CUT_EXTRUDE5_DEPTH + CUT_EXTRUDE5_DEPTH_BACK, mode=Mode.SUBTRACT)


with BuildPart() as body_3:
    # Sketch5 → Boss-Extrude4 (new body)
    with BuildSketch(Plane(origin=(0, 0, -10), x_dir=(-1, 0, 0), z_dir=(0, 0, -1))):
        with BuildLine():
            Line((-25.679542401, 28.475112108), (-25.679542401, -29.814887892))
            ThreePointArc((-25.679542401, -29.814887892), (-25.093755963, -31.229101455), (-23.679542401, -31.814887892))
            Line((-23.679542401, -31.814887892), (54.461659193, -31.814887892))
            ThreePointArc((54.461659193, -31.814887892), (55.875872755, -31.229101455), (56.461659193, -29.814887892))
            Line((56.461659193, -29.814887892), (56.461659193, 28.475112108))
            ThreePointArc((56.461659193, 28.475112108), (55.875872755, 29.88932567), (54.461659193, 30.475112108))
            Line((54.461659193, 30.475112108), (-23.679542401, 30.475112108))
            ThreePointArc((-23.679542401, 30.475112108), (-25.093755963, 29.88932567), (-25.679542401, 28.475112108))
        make_face()
    extrude(amount=BOSS_EXTRUDE4_DEPTH)


solid = Compound([part.part, body_2.part, body_3.part])
